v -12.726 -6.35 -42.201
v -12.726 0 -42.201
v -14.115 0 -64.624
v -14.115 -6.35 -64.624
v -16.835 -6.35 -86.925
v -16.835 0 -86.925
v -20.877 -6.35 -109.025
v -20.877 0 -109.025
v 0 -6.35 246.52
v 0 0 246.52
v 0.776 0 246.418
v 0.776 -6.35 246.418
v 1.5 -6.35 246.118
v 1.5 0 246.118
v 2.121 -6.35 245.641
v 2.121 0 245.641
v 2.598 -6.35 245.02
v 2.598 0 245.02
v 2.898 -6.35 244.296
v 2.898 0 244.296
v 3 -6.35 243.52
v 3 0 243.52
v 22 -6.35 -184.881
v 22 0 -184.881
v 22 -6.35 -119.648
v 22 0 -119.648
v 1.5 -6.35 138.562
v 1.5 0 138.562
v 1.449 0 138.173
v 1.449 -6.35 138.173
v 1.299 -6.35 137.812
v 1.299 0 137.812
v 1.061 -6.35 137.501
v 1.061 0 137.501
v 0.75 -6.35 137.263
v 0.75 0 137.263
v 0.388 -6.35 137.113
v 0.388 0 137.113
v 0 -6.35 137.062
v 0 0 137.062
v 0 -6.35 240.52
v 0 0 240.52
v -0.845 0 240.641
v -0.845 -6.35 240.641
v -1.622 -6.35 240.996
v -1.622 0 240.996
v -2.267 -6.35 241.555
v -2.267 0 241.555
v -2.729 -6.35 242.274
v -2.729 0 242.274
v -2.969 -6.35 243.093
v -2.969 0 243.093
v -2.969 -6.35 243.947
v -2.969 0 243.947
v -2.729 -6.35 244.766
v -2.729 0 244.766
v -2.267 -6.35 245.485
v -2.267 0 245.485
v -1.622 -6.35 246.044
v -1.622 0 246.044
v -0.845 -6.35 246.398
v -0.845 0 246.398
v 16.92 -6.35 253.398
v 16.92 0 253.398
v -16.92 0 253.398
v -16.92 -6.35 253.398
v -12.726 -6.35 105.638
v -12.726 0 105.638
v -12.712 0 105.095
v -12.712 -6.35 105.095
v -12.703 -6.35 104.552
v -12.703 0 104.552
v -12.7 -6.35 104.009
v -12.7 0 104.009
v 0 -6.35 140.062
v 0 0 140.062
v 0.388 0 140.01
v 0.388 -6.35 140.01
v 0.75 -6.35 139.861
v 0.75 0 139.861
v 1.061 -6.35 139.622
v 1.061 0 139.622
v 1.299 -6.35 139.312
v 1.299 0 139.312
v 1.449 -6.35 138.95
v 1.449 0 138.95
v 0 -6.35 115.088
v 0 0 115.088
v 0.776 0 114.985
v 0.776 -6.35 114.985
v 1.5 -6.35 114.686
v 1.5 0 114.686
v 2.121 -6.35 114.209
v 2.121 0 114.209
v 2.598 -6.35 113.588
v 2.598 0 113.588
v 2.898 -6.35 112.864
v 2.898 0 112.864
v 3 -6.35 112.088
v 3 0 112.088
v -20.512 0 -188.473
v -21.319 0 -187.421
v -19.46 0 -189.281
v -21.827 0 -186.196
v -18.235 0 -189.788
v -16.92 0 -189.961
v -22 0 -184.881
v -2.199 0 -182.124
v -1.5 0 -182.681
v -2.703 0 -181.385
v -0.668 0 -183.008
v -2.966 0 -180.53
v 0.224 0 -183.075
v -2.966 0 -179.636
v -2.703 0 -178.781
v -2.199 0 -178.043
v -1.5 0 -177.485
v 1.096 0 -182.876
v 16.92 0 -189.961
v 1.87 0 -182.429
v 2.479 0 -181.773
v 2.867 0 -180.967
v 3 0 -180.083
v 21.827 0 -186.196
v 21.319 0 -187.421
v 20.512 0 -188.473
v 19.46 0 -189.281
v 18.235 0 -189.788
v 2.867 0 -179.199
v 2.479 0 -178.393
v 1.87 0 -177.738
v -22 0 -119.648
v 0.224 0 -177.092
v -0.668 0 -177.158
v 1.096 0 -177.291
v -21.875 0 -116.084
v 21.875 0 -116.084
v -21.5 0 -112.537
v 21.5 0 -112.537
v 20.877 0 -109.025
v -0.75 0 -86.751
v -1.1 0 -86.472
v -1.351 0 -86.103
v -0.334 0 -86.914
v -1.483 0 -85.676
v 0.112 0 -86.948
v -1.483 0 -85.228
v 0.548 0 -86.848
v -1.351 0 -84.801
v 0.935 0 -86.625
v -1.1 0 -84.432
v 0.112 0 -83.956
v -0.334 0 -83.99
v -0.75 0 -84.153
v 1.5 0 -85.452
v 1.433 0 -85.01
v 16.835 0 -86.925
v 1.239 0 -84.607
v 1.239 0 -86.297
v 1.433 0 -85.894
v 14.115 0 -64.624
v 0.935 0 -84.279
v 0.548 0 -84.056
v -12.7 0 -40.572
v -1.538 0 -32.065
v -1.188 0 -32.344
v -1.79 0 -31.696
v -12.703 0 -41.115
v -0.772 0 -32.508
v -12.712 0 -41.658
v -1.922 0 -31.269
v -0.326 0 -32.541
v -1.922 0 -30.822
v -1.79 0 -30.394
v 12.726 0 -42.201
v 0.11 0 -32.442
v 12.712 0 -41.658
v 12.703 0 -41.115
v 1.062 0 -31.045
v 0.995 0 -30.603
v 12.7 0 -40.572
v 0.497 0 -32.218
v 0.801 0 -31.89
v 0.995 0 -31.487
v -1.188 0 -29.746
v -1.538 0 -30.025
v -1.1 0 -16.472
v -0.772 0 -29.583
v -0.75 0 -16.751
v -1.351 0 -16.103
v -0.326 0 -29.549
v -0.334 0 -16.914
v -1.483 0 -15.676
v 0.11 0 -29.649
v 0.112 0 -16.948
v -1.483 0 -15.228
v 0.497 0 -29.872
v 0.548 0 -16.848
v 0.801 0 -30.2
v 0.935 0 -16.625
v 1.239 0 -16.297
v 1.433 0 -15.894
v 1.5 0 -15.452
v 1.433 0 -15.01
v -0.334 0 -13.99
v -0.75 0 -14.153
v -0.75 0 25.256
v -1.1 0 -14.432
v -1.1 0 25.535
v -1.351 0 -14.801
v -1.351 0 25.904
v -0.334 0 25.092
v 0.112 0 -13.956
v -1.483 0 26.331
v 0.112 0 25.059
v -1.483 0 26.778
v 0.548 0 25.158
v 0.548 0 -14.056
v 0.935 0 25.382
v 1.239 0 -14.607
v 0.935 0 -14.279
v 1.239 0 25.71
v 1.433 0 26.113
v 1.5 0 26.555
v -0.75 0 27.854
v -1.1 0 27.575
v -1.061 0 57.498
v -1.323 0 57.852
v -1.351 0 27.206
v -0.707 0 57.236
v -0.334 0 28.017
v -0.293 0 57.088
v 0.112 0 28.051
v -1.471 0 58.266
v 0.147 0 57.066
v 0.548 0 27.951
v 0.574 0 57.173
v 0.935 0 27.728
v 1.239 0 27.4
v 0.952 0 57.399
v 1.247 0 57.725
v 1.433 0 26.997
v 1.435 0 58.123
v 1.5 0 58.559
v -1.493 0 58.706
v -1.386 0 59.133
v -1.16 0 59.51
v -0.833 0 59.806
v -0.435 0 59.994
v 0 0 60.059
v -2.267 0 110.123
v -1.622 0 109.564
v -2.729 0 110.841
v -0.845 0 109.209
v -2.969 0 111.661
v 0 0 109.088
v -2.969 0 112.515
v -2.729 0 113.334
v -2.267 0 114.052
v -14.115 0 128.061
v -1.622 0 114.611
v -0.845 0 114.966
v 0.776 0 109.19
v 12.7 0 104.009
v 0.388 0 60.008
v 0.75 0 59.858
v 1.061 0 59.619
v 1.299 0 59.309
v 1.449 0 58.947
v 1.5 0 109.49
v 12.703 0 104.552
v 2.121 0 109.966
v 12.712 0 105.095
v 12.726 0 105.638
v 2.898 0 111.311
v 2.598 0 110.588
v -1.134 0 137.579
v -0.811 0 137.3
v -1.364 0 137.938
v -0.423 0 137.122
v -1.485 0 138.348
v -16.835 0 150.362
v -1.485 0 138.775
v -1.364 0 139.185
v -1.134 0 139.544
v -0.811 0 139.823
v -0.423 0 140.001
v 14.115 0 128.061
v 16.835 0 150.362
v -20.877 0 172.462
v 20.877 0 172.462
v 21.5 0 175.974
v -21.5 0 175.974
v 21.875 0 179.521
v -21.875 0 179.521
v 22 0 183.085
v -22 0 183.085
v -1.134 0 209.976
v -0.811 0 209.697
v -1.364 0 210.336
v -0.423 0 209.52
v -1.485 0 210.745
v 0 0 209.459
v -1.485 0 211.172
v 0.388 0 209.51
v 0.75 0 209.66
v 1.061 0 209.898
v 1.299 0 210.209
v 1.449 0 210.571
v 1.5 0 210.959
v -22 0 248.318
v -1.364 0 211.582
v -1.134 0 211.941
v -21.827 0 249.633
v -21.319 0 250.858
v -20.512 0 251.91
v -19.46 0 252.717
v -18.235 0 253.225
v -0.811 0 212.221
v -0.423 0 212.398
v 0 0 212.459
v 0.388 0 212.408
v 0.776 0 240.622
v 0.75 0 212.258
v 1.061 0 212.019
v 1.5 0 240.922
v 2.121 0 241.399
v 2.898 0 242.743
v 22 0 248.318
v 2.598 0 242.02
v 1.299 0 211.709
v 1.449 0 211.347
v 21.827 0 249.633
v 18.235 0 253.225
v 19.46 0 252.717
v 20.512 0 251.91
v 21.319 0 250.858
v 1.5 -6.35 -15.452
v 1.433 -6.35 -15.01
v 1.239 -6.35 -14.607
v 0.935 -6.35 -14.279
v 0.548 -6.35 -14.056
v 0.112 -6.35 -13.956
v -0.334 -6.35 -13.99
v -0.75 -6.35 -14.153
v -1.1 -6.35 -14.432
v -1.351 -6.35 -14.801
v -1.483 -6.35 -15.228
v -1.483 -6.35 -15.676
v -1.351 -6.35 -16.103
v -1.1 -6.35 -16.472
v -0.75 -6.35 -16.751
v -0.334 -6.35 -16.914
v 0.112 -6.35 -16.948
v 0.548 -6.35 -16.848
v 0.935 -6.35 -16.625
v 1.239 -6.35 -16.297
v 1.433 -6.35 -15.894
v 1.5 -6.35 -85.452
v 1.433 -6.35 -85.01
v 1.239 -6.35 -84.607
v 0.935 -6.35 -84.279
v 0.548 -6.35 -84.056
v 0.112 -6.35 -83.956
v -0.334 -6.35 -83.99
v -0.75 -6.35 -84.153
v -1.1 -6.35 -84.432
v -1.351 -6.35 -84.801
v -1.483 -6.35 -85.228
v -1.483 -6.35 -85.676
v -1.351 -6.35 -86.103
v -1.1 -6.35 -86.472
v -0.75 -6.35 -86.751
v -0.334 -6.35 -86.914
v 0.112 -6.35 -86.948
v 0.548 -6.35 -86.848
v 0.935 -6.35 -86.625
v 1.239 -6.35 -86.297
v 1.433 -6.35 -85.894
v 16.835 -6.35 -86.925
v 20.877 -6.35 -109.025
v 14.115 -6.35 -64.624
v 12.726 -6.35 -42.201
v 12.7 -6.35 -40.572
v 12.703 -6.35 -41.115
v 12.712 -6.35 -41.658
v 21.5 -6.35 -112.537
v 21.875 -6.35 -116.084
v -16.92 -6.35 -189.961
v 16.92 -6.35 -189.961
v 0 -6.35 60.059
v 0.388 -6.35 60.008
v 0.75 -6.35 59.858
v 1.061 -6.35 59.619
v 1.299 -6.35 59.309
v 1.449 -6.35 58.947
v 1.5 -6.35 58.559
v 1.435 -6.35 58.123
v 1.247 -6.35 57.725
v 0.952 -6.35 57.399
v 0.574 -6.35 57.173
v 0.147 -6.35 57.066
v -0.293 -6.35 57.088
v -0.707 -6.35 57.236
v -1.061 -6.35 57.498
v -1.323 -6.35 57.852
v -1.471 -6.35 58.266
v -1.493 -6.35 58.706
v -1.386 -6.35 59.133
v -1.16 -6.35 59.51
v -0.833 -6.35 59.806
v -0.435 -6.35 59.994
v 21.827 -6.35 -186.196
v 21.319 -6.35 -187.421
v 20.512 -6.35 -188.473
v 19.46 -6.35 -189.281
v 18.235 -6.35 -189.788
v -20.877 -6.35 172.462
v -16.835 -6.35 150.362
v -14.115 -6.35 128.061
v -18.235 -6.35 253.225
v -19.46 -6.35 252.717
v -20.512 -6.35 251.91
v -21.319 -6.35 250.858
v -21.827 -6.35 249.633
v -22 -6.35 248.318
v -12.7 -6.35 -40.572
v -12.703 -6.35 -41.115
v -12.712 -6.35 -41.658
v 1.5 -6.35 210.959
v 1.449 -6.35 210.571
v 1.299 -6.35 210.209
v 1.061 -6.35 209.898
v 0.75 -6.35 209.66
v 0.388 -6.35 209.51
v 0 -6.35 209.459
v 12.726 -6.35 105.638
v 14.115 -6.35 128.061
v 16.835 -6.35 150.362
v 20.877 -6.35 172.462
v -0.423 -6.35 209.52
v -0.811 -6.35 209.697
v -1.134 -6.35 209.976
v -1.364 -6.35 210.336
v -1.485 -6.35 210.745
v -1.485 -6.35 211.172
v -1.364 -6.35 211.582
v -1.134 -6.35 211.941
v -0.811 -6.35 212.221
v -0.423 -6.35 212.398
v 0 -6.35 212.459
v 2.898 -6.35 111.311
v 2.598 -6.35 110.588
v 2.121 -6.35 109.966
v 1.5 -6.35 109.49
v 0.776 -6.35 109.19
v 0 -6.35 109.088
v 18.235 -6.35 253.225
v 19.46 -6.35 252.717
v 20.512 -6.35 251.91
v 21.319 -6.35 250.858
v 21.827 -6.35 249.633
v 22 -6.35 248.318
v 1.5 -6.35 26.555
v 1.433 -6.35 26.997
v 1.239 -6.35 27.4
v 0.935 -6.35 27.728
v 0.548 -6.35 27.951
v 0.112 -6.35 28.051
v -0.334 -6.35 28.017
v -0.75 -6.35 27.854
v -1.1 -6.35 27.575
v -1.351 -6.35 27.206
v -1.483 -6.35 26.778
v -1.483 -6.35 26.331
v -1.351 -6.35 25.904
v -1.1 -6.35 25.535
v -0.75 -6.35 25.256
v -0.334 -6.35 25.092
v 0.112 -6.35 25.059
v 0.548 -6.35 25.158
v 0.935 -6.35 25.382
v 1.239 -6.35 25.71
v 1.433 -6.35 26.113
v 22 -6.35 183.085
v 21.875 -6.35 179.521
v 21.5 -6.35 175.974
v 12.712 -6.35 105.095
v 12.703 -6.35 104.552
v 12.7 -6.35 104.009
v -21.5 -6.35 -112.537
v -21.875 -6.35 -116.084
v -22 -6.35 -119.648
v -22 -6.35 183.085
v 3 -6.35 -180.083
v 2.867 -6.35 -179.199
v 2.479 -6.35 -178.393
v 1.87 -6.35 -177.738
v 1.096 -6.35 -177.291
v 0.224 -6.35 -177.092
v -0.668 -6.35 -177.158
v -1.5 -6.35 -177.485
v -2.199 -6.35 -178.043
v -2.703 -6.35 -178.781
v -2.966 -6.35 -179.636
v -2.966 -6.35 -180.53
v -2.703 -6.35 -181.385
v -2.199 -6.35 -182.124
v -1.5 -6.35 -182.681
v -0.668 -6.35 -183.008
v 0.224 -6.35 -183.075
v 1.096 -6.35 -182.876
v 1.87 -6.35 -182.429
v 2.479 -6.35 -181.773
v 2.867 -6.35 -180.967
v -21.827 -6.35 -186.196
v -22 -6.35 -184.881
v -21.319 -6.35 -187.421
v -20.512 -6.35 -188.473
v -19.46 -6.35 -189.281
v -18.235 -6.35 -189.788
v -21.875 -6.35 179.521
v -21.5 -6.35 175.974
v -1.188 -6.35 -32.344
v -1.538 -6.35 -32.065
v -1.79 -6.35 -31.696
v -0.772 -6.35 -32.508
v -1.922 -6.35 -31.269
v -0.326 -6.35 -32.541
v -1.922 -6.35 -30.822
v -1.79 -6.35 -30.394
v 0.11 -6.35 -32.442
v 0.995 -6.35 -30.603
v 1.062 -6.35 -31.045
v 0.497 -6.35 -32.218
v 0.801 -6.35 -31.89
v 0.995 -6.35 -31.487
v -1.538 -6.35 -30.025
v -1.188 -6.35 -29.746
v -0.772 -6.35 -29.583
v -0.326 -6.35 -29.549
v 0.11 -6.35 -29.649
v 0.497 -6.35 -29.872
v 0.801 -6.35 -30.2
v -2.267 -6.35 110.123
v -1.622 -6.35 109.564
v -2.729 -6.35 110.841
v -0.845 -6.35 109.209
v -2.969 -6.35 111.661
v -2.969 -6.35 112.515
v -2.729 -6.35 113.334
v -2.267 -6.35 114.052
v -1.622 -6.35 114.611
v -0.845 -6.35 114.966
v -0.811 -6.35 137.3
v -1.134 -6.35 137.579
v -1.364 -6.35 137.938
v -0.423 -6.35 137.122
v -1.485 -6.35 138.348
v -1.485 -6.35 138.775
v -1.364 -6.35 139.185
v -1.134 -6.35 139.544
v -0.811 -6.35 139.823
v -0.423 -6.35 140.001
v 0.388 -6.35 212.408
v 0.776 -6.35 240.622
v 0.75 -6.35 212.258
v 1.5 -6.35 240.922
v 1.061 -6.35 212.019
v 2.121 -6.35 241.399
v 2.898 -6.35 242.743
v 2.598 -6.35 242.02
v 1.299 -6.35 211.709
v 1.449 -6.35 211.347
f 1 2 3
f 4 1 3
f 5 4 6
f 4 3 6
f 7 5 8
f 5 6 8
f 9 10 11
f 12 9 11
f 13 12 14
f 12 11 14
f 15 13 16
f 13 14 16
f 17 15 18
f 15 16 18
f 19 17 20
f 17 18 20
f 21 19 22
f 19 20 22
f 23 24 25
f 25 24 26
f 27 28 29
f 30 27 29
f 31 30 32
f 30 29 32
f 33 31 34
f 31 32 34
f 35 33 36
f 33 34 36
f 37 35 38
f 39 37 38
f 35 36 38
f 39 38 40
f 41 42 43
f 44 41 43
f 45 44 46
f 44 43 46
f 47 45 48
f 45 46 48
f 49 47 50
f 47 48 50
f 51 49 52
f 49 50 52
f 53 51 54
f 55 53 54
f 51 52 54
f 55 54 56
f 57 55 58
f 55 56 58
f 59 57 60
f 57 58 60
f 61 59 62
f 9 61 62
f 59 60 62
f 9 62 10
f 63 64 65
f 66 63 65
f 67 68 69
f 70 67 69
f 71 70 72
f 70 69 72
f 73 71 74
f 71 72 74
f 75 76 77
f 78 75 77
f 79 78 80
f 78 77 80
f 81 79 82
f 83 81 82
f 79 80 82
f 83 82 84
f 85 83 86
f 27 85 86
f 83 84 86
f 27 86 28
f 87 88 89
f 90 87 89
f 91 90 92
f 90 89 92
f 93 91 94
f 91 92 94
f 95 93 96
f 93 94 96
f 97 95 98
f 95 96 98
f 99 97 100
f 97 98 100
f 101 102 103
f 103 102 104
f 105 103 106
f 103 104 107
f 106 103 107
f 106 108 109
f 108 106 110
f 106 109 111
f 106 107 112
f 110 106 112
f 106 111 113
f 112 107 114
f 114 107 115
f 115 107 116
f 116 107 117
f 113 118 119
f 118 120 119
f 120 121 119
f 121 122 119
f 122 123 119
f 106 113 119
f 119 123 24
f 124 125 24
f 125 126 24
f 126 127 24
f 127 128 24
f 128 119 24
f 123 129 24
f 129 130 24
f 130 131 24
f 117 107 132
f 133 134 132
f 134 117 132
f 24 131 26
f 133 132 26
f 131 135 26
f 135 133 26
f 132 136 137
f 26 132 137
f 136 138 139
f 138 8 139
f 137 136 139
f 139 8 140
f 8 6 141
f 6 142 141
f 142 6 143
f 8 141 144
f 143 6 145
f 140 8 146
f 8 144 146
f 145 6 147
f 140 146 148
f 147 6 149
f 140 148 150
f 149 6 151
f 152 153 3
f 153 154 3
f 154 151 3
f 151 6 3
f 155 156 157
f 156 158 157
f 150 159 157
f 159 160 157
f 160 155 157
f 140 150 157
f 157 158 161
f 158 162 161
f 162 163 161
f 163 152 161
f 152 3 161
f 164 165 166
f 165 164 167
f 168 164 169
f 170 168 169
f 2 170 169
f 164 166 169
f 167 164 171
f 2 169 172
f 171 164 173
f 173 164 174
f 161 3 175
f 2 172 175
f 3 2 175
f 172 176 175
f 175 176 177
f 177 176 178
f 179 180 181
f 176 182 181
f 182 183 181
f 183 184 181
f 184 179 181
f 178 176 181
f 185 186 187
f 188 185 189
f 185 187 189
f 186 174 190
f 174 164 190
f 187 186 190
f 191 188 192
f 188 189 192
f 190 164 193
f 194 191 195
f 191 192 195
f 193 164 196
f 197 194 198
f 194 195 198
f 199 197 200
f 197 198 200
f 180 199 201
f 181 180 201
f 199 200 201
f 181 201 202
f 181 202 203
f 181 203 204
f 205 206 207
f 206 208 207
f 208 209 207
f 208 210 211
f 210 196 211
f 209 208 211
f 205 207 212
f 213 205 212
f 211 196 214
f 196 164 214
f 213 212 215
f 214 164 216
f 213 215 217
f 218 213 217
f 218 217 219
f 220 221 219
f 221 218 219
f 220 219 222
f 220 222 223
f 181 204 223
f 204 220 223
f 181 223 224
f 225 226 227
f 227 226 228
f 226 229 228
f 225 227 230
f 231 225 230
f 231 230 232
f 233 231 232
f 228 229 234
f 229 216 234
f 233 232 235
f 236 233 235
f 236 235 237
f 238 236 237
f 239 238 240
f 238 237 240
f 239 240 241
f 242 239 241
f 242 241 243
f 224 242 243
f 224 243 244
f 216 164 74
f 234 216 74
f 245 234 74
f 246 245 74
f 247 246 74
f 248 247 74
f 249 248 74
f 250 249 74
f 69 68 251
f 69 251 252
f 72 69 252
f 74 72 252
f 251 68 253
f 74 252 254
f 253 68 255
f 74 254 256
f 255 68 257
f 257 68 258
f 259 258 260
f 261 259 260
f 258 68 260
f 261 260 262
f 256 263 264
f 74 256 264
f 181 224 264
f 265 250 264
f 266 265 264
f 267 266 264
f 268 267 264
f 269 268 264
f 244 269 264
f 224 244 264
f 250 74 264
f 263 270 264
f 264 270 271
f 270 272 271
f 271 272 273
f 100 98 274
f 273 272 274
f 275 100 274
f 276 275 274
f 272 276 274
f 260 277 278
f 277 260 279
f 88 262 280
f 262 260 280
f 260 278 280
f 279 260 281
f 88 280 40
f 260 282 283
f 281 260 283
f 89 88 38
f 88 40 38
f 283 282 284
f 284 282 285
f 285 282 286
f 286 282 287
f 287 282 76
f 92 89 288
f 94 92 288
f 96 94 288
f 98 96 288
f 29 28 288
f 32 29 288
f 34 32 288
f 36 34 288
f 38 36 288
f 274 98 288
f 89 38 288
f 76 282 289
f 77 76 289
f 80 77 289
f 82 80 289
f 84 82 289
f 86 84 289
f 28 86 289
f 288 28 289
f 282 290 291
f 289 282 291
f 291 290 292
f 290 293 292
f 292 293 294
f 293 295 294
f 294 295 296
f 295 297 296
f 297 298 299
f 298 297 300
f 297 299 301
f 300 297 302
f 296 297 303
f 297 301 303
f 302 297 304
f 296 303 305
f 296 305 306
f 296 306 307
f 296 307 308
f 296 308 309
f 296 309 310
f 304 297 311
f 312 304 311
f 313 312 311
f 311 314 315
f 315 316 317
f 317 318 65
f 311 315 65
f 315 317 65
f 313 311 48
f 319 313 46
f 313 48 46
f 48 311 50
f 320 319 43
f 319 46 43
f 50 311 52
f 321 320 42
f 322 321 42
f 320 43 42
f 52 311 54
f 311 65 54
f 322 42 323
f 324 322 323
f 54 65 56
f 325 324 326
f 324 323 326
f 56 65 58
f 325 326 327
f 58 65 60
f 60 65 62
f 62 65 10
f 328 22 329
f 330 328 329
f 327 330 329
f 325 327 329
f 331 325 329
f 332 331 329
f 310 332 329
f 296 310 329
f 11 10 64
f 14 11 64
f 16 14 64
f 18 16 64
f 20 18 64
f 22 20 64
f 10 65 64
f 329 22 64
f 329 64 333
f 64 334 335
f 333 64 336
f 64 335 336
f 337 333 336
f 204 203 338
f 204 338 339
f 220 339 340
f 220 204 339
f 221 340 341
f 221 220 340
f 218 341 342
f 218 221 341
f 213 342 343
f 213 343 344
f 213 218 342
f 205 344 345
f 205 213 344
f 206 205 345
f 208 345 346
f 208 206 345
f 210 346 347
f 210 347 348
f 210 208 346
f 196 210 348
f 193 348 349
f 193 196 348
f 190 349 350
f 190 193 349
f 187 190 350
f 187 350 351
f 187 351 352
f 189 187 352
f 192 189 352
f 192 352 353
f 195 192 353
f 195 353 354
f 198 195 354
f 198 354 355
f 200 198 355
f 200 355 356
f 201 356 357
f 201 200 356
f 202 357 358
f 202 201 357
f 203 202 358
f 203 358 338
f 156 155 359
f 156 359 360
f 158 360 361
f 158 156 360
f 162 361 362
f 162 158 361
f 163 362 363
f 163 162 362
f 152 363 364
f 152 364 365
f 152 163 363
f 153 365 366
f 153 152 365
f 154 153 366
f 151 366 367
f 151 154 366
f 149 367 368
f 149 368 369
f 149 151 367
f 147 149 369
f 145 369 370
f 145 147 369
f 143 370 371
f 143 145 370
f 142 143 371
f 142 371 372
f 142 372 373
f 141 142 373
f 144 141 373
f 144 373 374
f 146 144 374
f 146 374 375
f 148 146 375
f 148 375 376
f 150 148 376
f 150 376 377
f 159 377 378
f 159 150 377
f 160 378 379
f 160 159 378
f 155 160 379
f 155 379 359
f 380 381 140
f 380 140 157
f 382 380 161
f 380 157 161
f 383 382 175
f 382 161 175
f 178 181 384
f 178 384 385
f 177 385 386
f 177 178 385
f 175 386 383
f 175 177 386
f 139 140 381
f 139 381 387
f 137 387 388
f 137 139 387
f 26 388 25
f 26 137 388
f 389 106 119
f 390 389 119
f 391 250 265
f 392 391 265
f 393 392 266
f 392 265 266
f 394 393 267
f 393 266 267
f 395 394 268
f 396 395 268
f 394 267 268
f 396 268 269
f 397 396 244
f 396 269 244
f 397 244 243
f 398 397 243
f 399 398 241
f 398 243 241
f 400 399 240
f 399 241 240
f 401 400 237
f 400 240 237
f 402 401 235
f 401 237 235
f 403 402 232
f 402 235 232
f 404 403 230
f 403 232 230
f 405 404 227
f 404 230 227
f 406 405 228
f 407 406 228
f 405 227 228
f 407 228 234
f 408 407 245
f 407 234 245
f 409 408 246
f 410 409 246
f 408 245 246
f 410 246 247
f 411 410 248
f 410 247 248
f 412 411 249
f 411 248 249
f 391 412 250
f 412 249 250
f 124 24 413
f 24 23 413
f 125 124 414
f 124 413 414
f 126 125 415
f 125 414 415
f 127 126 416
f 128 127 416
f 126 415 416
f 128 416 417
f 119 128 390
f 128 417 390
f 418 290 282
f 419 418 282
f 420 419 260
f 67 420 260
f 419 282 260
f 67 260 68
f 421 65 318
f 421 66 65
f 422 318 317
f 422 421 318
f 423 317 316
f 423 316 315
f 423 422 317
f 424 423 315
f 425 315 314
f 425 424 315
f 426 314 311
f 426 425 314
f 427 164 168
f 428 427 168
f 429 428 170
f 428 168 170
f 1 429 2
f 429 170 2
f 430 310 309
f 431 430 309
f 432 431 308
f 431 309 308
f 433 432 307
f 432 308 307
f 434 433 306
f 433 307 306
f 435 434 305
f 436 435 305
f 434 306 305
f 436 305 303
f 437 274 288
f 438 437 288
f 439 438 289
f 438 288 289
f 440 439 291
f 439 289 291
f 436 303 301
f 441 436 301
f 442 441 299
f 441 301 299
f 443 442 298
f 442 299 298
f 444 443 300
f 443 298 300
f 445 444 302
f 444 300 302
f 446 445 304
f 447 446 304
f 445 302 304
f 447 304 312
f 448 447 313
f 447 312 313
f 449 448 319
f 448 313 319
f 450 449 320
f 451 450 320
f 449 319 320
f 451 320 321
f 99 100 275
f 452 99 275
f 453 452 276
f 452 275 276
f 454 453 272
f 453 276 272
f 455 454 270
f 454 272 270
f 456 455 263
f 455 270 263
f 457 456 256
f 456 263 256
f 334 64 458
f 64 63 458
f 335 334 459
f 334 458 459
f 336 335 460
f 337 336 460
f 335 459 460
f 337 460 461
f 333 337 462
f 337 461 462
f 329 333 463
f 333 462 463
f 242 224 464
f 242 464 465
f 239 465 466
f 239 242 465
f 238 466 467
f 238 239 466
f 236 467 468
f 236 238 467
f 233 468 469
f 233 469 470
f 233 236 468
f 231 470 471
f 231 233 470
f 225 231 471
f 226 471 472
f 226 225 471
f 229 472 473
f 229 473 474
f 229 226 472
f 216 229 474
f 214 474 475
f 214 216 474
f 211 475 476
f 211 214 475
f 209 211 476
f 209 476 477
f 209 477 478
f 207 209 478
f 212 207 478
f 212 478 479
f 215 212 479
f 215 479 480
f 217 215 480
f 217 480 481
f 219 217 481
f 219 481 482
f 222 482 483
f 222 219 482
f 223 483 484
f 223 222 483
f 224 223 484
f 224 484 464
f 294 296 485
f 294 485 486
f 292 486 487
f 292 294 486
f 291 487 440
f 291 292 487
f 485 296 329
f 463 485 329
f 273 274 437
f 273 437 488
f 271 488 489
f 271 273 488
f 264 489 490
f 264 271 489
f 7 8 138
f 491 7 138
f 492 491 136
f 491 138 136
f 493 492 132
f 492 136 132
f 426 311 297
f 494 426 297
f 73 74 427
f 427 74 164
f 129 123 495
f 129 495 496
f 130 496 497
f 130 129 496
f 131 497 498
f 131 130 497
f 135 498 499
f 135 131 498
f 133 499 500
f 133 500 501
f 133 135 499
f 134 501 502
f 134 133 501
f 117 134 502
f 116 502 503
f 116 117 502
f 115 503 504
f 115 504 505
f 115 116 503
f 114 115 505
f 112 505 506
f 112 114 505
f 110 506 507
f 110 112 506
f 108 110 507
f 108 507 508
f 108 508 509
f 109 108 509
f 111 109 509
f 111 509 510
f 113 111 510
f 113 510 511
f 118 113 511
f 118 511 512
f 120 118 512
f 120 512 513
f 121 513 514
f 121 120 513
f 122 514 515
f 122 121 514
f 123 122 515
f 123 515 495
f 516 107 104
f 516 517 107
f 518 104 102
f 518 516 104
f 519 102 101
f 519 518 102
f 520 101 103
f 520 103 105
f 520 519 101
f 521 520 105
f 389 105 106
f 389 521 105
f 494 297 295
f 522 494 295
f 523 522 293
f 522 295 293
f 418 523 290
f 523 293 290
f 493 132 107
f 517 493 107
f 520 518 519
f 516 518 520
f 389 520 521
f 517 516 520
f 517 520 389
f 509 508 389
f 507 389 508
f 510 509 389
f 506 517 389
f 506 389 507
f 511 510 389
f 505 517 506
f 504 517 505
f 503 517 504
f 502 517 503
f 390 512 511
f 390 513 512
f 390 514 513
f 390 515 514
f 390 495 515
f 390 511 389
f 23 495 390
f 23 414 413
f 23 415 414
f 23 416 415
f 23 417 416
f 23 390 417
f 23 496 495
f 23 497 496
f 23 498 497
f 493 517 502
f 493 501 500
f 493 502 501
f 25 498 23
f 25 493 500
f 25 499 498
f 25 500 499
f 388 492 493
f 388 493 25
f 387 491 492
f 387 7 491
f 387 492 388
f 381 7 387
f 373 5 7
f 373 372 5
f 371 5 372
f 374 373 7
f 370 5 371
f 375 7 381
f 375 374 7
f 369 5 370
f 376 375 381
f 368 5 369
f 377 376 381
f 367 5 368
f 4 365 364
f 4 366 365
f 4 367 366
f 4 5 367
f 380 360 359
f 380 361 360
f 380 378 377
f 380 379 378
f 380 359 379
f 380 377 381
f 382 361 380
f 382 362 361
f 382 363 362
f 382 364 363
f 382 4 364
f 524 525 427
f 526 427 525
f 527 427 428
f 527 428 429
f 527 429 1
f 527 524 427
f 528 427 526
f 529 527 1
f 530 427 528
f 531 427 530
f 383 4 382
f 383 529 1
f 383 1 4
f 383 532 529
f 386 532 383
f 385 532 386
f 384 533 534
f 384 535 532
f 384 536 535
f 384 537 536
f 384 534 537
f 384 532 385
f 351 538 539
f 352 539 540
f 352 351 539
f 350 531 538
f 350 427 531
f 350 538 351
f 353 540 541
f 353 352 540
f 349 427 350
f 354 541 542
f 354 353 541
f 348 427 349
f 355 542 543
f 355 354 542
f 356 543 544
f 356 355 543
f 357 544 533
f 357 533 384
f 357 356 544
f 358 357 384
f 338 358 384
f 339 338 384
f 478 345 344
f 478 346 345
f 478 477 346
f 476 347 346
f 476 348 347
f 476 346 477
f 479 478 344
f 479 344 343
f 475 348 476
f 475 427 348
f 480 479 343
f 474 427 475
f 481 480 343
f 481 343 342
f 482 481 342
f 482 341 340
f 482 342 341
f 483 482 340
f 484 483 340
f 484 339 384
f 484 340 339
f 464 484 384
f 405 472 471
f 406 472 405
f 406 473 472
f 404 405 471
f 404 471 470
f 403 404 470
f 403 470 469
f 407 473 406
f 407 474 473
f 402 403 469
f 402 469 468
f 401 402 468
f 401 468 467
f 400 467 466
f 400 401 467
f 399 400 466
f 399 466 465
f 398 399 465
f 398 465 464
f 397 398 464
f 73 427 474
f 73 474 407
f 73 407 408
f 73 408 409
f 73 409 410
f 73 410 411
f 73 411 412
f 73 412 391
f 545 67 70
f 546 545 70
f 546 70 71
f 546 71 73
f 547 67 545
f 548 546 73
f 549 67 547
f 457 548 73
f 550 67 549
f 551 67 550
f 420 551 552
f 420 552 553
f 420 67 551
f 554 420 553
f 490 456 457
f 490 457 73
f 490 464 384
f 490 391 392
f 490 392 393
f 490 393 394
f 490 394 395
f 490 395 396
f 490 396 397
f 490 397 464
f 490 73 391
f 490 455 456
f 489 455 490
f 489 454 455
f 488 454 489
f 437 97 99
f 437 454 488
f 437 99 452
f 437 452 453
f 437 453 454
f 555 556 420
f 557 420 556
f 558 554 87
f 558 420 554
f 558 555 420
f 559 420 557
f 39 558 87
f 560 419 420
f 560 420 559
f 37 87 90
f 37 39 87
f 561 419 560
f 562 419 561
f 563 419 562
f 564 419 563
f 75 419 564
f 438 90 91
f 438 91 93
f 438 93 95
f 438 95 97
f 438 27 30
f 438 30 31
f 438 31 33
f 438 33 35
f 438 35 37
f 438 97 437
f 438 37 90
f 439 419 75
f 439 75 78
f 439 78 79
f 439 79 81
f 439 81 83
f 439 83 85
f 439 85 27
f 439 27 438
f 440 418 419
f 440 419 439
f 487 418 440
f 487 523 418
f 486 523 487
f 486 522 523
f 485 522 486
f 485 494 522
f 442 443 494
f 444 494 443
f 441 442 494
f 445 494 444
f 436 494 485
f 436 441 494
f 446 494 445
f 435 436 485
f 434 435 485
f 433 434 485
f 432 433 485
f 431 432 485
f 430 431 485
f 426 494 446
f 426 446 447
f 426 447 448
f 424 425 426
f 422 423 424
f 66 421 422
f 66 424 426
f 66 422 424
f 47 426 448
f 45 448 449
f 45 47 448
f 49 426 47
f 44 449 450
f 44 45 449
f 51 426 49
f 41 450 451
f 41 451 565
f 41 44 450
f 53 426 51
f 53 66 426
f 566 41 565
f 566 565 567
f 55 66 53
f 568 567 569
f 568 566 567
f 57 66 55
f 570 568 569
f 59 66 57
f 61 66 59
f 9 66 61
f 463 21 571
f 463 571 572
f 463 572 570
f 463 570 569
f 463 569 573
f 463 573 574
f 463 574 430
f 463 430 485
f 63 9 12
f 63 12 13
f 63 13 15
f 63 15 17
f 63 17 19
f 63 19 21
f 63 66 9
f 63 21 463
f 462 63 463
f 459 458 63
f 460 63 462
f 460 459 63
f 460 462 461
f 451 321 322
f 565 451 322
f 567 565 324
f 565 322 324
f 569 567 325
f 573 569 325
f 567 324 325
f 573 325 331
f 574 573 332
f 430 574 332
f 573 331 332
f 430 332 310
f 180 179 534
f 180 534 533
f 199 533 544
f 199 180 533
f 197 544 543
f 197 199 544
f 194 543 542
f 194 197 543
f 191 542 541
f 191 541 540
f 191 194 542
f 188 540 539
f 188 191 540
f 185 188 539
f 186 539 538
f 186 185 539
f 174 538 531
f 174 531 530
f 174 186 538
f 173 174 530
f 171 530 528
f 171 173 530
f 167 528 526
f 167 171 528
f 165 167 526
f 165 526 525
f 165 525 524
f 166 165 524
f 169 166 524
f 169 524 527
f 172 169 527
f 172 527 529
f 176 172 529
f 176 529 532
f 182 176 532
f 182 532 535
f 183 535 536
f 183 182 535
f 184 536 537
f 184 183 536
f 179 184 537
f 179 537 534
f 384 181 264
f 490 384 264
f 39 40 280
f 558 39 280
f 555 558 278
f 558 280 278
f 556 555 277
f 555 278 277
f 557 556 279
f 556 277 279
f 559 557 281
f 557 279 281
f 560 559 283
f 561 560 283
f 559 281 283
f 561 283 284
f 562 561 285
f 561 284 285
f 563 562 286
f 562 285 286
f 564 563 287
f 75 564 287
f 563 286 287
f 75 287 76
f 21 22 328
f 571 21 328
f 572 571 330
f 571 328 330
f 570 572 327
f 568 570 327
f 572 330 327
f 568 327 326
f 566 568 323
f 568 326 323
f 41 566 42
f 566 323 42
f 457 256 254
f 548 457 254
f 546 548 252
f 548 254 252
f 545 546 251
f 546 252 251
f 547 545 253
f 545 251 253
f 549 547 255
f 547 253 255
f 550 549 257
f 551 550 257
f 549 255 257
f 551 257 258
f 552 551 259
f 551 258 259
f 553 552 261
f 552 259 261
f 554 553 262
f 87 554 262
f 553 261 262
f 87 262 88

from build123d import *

# Parameters (mm, degrees)
F0_R        = 1.5
F0_R_2      = 3
F1_DEPTH    = 6.35
F2_R        = 5.08
F3_T1_DEPTH = 6.35
F3_T3_DEPTH = 34.0624500619


# Not quite as in the source:
# - a fillet or chamfer that OpenCascade refuses, or shapes differently, is made with other operations: its cross-section is extruded or revolved along the edge and cut away or added
# - a feature names something its author has since deleted; it is built from what else it names


with BuildPart() as f1:
    # F0 (on Front) → F1 (new body)
    with BuildSketch(Plane.XZ):
        Polygon((-12.7, 104.7939062119), (-12.7, -41.3571195934), (-12.7, -95.0903743505), (12.7, -95.0903743505), (12.7, -41.3571195934), (12.7, 104.7939062119), (12.7, 162.231490016), (0, 162.231490016), (-12.7, 162.231490016), align=None)
        with Locations((-0.4384766798, -31.0452261312)):
            Circle(F0_R, mode=Mode.SUBTRACT)
        with Locations((0, -85.4520261312)):
            Circle(F0_R, mode=Mode.SUBTRACT)
        with Locations((0, -15.4520261312)):
            Circle(F0_R, mode=Mode.SUBTRACT)
        with Locations((0, 26.5547856688)):
            Circle(F0_R, mode=Mode.SUBTRACT)
        with BuildLine():
            ThreePointArc((1.5, 58.5587856688), (-1.0606601718, 57.4981254971), (0, 60.0587856688))
            ThreePointArc((0, 60.0587856688), (1.0606601718, 59.6194458406), (1.5, 58.5587856688))
        make_face(mode=Mode.SUBTRACT)
        with BuildLine():
            ThreePointArc((0, 109.0876222849), (-3, 112.0876222849), (0, 115.0876222849))
            ThreePointArc((0, 115.0876222849), (2.1213203436, 114.2089426284), (3, 112.0876222849))
            ThreePointArc((3, 112.0876222849), (2.1213203436, 109.9663019413), (0, 109.0876222849))
        make_face(mode=Mode.SUBTRACT)
        with BuildLine():
            ThreePointArc((0, 137.0615974688), (-1.5, 138.5615974688), (0, 140.0615974688))
            ThreePointArc((0, 140.0615974688), (1.0606601718, 139.6222576406), (1.5, 138.5615974688))
            ThreePointArc((1.5, 138.5615974688), (1.0606601718, 137.5009372971), (0, 137.0615974688))
        make_face(mode=Mode.SUBTRACT)
        with BuildLine():
            ThreePointArc((-22, 177.5426715612), (-15.5787747464, 141.3947174009), (-12.7, 104.7939062119))
            Line((-12.7, 104.7939062119), (-12.7, 162.231490016))
            Line((-12.7, 162.231490016), (0, 162.231490016))
            Line((0, 162.231490016), (0, 177.1979365494))
            Line((0, 177.1979365494), (0, 209.4587856688))
            ThreePointArc((0, 209.4587856688), (-1.5, 210.9587856688), (0, 212.4587856688))
            Line((0, 212.4587856688), (0, 240.5199192026))
            ThreePointArc((0, 240.5199192026), (-3, 243.5199192026), (0, 246.5199192026))
            Line((0, 246.5199192026), (0, 253.3979365494))
            Line((0, 253.3979365494), (-4.6853246795, 253.3979365494))
            Line((-4.6853246795, 253.3979365494), (-22, 253.3979365494))
            Line((-22, 253.3979365494), (-22, 236.307715069))
            Line((-22, 236.307715069), (-22, 225.4278063774))
            Line((-22, 225.4278063774), (-22, 177.5426715612))
        make_face()
        with BuildLine():
            Line((12.7, 162.231490016), (12.7, 104.7939062119))
            ThreePointArc((12.7, 104.7939062119), (15.5787747464, 141.3947174009), (22, 177.5426715612))
            Line((22, 177.5426715612), (22, 225.4278063774))
            Line((22, 225.4278063774), (22, 236.307715069))
            Line((22, 236.307715069), (22, 253.3979365494))
            Line((22, 253.3979365494), (4.6853246795, 253.3979365494))
            Line((4.6853246795, 253.3979365494), (0, 253.3979365494))
            Line((0, 253.3979365494), (0, 246.5199192026))
            ThreePointArc((0, 246.5199192026), (2.1213203436, 245.6412395461), (3, 243.5199192026))
            ThreePointArc((3, 243.5199192026), (2.1213203436, 241.398598859), (0, 240.5199192026))
            Line((0, 240.5199192026), (0, 212.4587856688))
            ThreePointArc((0, 212.4587856688), (1.0606601718, 212.0194458406), (1.5, 210.9587856688))
            ThreePointArc((1.5, 210.9587856688), (1.0606601718, 209.8981254971), (0, 209.4587856688))
            Line((0, 209.4587856688), (0, 177.1979365494))
            Line((0, 177.1979365494), (0, 162.231490016))
            Line((0, 162.231490016), (12.7, 162.231490016))
        make_face()
        with BuildLine():
            Line((-22, -189.9611499309), (-4.6853246795, -189.9611499309))
            ThreePointArc((-4.6853246795, -189.9611499309), (-10.3525559476, -187.6137058785), (-12.7, -181.9464746103))
            Line((-12.7, -181.9464746103), (-12.7, -113.7611499309))
            Line((-12.7, -113.7611499309), (12.7, -113.7611499309))
            Line((12.7, -113.7611499309), (12.7, -181.9464746103))
            ThreePointArc((12.7, -181.9464746103), (10.3525559476, -187.6137058785), (4.6853246795, -189.9611499309))
            Line((4.6853246795, -189.9611499309), (22, -189.9611499309))
            Line((22, -189.9611499309), (22, -172.8709284505))
            Line((22, -172.8709284505), (22, -161.9910197589))
            Line((22, -161.9910197589), (22, -114.1058849427))
            ThreePointArc((22, -114.1058849427), (15.5787747464, -77.9579307824), (12.7, -41.3571195934))
            Line((12.7, -41.3571195934), (12.7, -95.0903743505))
            Line((12.7, -95.0903743505), (-12.7, -95.0903743505))
            Line((-12.7, -95.0903743505), (-12.7, -41.3571195934))
            ThreePointArc((-12.7, -41.3571195934), (-15.5787747464, -77.9579307824), (-22, -114.1058849427))
            Line((-22, -114.1058849427), (-22, -161.9910197589))
            Line((-22, -161.9910197589), (-22, -172.8709284505))
            Line((-22, -172.8709284505), (-22, -189.9611499309))
        make_face()
        with BuildLine():
            ThreePointArc((-12.7, -181.9464746103), (-10.3525559476, -187.6137058785), (-4.6853246795, -189.9611499309))
            Line((-4.6853246795, -189.9611499309), (0, -189.9611499309))
            Line((0, -189.9611499309), (4.6853246795, -189.9611499309))
            ThreePointArc((4.6853246795, -189.9611499309), (10.3525559476, -187.6137058785), (12.7, -181.9464746103))
            Line((12.7, -181.9464746103), (12.7, -113.7611499309))
            Line((12.7, -113.7611499309), (-12.7, -113.7611499309))
            Line((-12.7, -113.7611499309), (-12.7, -181.9464746103))
        make_face()
        with Locations((0, -180.0831407309)):
            Circle(F0_R_2, mode=Mode.SUBTRACT)
    extrude(amount=F1_DEPTH)

    # F2
    f2_edges = [f1.edges().sort_by_distance(p)[0] for p in [
        (-22, -3.175, 253.397937),
        (22, -3.175, 253.397937),
        (22, -3.175, -189.96115),
        (-22, -3.175, -189.96115),
    ]]
    fillet(f2_edges, radius=F2_R)

    # F3: fillet of radius 50.8 on 8 edges, made by hand

    # F3_s2 → F3_t1 (join)
    with BuildSketch(Plane.XZ):
        with BuildLine():
            ThreePointArc((-12.7261251288, 105.6376323271), (-12.7065317021, 104.8232386677), (-12.7, 104.0086355302))
            Line((-12.7, 104.0086355302), (-12.7, 104.7939062119))
            ThreePointArc((-12.7, 104.7939062119), (-12.7128266876, 105.2157765732), (-12.7261251288, 105.6376323271))
        make_face()
        with BuildLine():
            ThreePointArc((12.7261251288, 105.6376323271), (12.7065317021, 104.8232386677), (12.7, 104.0086355302))
            Line((12.7, 104.0086355302), (12.7, 104.7939062119))
            ThreePointArc((12.7, 104.7939062119), (12.7128266876, 105.2157765732), (12.7261251288, 105.6376323271))
        make_face()
        with BuildLine():
            ThreePointArc((12.7, -40.5718489117), (12.7065317021, -41.3864520492), (12.7261251288, -42.2008457086))
            ThreePointArc((12.7261251288, -42.2008457086), (12.7128266876, -41.7789899547), (12.7, -41.3571195934))
            Line((12.7, -41.3571195934), (12.7, -40.5718489117))
        make_face()
        with BuildLine():
            ThreePointArc((-12.7, -40.5718489116), (-12.7065317021, -41.3864520492), (-12.7261251288, -42.2008457086))
            ThreePointArc((-12.7261251288, -42.2008457086), (-12.7128266876, -41.7789899547), (-12.7, -41.3571195934))
            Line((-12.7, -41.3571195934), (-12.7, -40.5718489116))
        make_face()
    extrude(amount=F3_T1_DEPTH)

    # F3_s4 → F3_t3 (cut)
    with BuildSketch(Plane.XZ.offset(-13.856225031)):
        with BuildLine():
            ThreePointArc((-20.8768334444, -109.025182453), (-21.7184280188, -114.3071737314), (-22, -119.6483749551))
            Line((-22, -119.6483749551), (-22, -114.1058849427))
            ThreePointArc((-22, -114.1058849427), (-21.429661091, -111.5674692633), (-20.8768334444, -109.025182453))
        make_face()
        with BuildLine():
            ThreePointArc((20.8768334444, -109.025182453), (21.7184280188, -114.3071737314), (22, -119.6483749551))
            Line((22, -119.6483749551), (22, -114.1058849427))
            ThreePointArc((22, -114.1058849427), (21.429661091, -111.5674692633), (20.8768334444, -109.025182453))
        make_face()
        with BuildLine():
            ThreePointArc((22, 183.0851615736), (21.7184280188, 177.7439603499), (20.8768334444, 172.4619690715))
            ThreePointArc((20.8768334444, 172.4619690715), (21.429661091, 175.0042558818), (22, 177.5426715612))
            Line((22, 177.5426715612), (22, 183.0851615736))
        make_face()
        with BuildLine():
            ThreePointArc((-22, 183.0851615736), (-21.7184280188, 177.7439603499), (-20.8768334444, 172.4619690715))
            ThreePointArc((-20.8768334444, 172.4619690715), (-21.429661091, 175.0042558818), (-22, 177.5426715612))
            Line((-22, 177.5426715612), (-22, 183.0851615736))
        make_face()
    extrude(amount=F3_T3_DEPTH, mode=Mode.SUBTRACT)


solid = f1.part
